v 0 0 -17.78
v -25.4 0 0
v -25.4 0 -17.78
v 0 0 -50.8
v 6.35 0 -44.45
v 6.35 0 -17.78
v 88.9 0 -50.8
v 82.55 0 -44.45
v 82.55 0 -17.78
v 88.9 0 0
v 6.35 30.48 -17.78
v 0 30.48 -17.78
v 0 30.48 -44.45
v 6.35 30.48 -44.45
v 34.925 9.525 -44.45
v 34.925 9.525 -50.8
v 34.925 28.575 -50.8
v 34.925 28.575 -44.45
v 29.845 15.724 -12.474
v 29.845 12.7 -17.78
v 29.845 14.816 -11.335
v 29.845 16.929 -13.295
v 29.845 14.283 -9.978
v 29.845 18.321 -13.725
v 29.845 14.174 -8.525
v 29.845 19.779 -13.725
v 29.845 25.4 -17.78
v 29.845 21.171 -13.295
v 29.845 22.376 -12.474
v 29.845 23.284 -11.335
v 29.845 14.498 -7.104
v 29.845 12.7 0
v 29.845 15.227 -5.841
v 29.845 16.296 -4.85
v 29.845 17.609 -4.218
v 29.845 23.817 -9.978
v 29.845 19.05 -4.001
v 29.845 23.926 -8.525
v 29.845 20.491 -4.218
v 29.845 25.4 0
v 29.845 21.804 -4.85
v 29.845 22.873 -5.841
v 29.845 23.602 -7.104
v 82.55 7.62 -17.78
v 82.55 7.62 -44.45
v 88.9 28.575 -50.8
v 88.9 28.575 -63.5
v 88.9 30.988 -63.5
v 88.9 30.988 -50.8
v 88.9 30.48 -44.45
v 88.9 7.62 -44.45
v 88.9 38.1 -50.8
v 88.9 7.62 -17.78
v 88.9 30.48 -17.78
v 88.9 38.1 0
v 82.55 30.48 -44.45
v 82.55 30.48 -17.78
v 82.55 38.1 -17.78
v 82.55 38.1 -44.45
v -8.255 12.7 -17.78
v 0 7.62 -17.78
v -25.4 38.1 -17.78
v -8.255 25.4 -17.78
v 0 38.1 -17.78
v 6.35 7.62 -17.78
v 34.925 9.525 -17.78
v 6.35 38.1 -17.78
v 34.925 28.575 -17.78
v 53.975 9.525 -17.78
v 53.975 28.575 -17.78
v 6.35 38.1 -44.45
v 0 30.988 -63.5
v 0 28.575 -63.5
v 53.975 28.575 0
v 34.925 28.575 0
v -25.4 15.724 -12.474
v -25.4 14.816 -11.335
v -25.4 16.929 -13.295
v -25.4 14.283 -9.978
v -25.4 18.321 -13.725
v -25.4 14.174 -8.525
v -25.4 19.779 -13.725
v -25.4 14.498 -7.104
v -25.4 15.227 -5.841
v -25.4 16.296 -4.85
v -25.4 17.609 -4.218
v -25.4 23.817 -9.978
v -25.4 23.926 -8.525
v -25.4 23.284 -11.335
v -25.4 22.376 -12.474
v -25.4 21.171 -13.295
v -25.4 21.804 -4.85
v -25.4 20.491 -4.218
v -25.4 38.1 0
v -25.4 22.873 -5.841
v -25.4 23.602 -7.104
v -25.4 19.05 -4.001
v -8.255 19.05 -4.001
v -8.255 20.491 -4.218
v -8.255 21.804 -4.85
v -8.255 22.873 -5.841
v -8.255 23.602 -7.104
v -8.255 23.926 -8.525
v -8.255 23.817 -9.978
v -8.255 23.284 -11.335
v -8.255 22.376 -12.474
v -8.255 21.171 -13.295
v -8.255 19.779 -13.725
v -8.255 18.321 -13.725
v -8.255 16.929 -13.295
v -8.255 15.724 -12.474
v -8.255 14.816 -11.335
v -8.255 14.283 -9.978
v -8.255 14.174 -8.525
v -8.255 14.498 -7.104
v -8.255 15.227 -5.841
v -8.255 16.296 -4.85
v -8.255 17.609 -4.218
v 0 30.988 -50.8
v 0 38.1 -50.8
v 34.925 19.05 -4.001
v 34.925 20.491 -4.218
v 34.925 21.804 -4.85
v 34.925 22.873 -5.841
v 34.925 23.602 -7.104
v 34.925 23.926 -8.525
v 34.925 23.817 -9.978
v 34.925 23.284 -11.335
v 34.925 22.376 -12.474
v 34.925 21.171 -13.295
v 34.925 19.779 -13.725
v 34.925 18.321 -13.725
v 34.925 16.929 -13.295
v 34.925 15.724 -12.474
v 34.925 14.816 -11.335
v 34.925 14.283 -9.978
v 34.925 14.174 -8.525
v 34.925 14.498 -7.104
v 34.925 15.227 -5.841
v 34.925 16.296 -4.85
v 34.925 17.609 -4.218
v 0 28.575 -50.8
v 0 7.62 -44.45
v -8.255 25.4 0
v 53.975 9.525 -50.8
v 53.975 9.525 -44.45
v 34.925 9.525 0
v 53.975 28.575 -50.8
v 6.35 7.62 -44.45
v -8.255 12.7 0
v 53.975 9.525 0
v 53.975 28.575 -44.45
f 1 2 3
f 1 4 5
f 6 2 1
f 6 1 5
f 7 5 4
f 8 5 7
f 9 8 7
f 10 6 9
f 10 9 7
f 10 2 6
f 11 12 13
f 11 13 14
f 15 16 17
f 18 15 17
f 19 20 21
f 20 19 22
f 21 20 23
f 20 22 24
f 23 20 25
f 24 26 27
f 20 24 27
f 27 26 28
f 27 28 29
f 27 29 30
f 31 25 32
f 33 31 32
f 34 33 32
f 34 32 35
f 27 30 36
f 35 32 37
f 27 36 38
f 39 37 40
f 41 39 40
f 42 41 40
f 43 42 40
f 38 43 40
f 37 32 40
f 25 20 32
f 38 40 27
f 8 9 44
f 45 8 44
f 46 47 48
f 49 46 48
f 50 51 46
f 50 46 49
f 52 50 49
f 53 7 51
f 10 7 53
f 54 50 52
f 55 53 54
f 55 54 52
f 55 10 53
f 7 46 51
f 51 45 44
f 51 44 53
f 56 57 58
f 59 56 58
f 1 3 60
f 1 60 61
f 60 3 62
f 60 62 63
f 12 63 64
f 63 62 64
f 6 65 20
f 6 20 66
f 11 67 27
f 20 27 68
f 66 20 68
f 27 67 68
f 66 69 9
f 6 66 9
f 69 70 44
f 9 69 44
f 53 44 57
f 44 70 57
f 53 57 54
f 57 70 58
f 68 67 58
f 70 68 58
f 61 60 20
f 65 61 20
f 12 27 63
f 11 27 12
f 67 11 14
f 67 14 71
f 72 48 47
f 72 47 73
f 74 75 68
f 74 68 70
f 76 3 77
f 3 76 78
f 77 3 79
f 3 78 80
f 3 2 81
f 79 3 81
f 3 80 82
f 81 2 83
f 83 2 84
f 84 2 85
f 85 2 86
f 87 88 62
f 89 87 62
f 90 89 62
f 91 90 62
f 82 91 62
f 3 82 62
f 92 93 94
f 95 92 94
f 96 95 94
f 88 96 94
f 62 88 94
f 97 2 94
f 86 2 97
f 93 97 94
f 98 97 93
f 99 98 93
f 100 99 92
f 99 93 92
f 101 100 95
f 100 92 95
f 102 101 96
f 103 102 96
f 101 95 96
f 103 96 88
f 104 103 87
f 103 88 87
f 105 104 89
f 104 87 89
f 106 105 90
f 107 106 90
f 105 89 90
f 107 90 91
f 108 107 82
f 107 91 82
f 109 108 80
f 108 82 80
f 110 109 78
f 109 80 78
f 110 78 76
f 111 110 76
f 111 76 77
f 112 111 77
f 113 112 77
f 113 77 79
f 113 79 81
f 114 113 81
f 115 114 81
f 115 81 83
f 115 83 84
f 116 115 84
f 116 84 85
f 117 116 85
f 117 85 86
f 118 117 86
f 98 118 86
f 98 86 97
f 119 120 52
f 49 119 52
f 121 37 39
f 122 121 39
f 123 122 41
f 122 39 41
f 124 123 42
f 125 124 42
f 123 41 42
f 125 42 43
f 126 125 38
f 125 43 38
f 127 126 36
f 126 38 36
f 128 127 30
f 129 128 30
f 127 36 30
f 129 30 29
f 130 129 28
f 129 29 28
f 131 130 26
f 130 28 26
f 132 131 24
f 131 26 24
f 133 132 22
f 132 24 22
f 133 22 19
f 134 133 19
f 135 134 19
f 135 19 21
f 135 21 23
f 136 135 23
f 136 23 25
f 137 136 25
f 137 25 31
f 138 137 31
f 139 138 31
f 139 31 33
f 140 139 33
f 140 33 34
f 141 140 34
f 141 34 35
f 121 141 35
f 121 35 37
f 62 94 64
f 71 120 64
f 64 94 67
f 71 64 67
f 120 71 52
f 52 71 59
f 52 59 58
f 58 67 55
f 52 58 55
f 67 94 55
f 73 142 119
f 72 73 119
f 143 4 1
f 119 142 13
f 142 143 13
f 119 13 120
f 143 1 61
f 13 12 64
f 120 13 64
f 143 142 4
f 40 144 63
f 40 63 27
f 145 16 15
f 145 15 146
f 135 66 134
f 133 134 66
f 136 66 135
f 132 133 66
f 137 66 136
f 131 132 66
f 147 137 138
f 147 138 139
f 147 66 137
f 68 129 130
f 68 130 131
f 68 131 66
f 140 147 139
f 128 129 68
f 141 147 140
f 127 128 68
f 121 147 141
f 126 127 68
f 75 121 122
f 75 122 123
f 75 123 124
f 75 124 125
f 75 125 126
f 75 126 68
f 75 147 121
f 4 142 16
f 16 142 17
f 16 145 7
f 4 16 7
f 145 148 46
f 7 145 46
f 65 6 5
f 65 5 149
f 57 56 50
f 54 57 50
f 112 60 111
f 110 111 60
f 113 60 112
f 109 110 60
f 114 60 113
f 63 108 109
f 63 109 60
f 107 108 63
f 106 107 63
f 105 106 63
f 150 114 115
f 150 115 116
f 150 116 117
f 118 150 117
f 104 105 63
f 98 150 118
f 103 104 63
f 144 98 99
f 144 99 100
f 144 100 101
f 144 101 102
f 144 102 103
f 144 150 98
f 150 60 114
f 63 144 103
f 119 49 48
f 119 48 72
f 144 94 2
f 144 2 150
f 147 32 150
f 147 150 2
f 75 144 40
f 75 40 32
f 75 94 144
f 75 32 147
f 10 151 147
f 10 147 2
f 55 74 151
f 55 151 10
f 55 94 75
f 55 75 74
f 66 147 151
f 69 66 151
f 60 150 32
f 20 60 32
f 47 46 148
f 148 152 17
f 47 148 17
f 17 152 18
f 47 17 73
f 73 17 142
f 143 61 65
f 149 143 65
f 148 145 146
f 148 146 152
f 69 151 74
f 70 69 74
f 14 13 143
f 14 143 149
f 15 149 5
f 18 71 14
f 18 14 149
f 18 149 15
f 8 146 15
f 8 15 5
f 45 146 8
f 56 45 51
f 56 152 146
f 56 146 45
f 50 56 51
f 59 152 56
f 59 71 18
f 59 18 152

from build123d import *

# Parameters (mm, degrees)
SKETCH1_W                = 88.9
SKETCH1_H                = 38.1
SKETCH1_W_2              = 25.4
BOSS_EXTRUDE1_DEPTH      = 17.78
SKETCH2_W                = 38.1
SKETCH2_H                = 12.7
SKETCH2_W_2              = 6.35
SKETCH2_H_2              = 7.62
SKETCH2_W_3              = 19.05
SKETCH2_H_3              = 19.05
CUT_EXTRUDE1_DEPTH       = 41.402
SKETCH3_W                = 19.05
SKETCH3_H                = 19.05
BOSS_EXTRUDE2_DEPTH      = 6.35
SPRINGPLUNGER_HOLE_REACH = 132.755
SKETCH6_R                = 4.8895
SKETCH8_W                = 6.35
SKETCH8_H                = 7.62
SUPPORT_DEPTH            = 50.8
SKETCH10_W               = 88.9
SKETCH10_H               = 2.413
BOSS_EXTRUDE3_DEPTH      = 12.7


with BuildPart() as part:
    # Sketch1 → Boss-Extrude1 (new body)
    with BuildSketch(Plane.XY):
        with Locations((44.45, 19.05)):
            Rectangle(SKETCH1_W, SKETCH1_H)
        with Locations((-12.7, 19.05)):
            Rectangle(SKETCH1_W_2, SKETCH1_H)
    extrude(amount=-BOSS_EXTRUDE1_DEPTH)

    # Sketch2 → Cut-Extrude1 (cut)
    with BuildSketch(Plane.XY):
        with Locations((10.795, 19.05)):
            Rectangle(SKETCH2_W, SKETCH2_H)
        with Locations((3.175, 34.29)):
            Rectangle(SKETCH2_W_2, SKETCH2_H_2)
        with Locations((3.175, 3.81)):
            Rectangle(SKETCH2_W_2, SKETCH2_H_2)
        with Locations((44.45, 19.05)):
            Rectangle(SKETCH2_W_3, SKETCH2_H_3)
        with Locations((85.725, 34.29)):
            Rectangle(SKETCH2_W_2, SKETCH2_H_2)
        with Locations((85.725, 3.81)):
            Rectangle(SKETCH2_W_2, SKETCH2_H_2)
    extrude(amount=-CUT_EXTRUDE1_DEPTH, mode=Mode.SUBTRACT)

    # SpringPlunger Hole: up to this face of the body (flat: up to its plane)
    springplunger_hole_end = Plane(part.part.faces().sort_by_distance((34.925, 19.05, -8.89))[0])
    # Sketch6 → SpringPlunger Hole (cut, up to the picked face)
    with BuildSketch(Plane.ZY.offset(25.4), mode=Mode.PRIVATE) as springplunger_hole_sk1:
        with Locations((-8.89, 19.05)):
            Circle(SKETCH6_R)
    springplunger_hole_tool1 = split(extrude(springplunger_hole_sk1.sketch, amount=-SPRINGPLUNGER_HOLE_REACH, mode=Mode.PRIVATE), bisect_by=springplunger_hole_end, keep=Keep.BOTH, mode=Mode.PRIVATE)
    add(springplunger_hole_tool1.solids().sort_by(Axis((-25.4, 19.05, -8.89), (1, 0, 0)))[0], mode=Mode.SUBTRACT)



with BuildPart() as body_2:
    # Sketch3 → Boss-Extrude2 (new body)
    with BuildSketch(Plane.XY.offset(-50.8)):
        Polygon((0, 30.48), (0, 7.62), (6.35, 7.62), (6.35, 0), (82.55, 0), (82.55, 7.62), (88.9, 7.62), (88.9, 30.48), (82.55, 30.48), (82.55, 38.1), (6.35, 38.1), (6.35, 30.48), align=None)
        with Locations((44.45, 19.05)):
            Rectangle(SKETCH3_W, SKETCH3_H, mode=Mode.SUBTRACT)
    extrude(amount=BOSS_EXTRUDE2_DEPTH)


with BuildPart() as part_1:
    add(part.part)

    add(body_2.part)  # Support merges body 2
    # Sketch8 → Support (add)
    with BuildSketch(Plane.XY):
        with Locations((3.175, 34.29)):
            Rectangle(SKETCH8_W, SKETCH8_H)
        with Locations((85.725, 34.29)):
            Rectangle(SKETCH8_W, SKETCH8_H)
        with Locations((85.725, 3.81)):
            Rectangle(SKETCH8_W, SKETCH8_H)
        with Locations((3.175, 3.81)):
            Rectangle(SKETCH8_W, SKETCH8_H)
    extrude(amount=-SUPPORT_DEPTH)

    # Sketch10 → Boss-Extrude3 (add)
    with BuildSketch(Plane(origin=(0, 0, -50.8), x_dir=(-1, 0, 0), z_dir=(0, 0, -1))):
        with Locations((-44.45, 29.7815)):
            Rectangle(SKETCH10_W, SKETCH10_H)
    extrude(amount=BOSS_EXTRUDE3_DEPTH)


solid = part_1.part
